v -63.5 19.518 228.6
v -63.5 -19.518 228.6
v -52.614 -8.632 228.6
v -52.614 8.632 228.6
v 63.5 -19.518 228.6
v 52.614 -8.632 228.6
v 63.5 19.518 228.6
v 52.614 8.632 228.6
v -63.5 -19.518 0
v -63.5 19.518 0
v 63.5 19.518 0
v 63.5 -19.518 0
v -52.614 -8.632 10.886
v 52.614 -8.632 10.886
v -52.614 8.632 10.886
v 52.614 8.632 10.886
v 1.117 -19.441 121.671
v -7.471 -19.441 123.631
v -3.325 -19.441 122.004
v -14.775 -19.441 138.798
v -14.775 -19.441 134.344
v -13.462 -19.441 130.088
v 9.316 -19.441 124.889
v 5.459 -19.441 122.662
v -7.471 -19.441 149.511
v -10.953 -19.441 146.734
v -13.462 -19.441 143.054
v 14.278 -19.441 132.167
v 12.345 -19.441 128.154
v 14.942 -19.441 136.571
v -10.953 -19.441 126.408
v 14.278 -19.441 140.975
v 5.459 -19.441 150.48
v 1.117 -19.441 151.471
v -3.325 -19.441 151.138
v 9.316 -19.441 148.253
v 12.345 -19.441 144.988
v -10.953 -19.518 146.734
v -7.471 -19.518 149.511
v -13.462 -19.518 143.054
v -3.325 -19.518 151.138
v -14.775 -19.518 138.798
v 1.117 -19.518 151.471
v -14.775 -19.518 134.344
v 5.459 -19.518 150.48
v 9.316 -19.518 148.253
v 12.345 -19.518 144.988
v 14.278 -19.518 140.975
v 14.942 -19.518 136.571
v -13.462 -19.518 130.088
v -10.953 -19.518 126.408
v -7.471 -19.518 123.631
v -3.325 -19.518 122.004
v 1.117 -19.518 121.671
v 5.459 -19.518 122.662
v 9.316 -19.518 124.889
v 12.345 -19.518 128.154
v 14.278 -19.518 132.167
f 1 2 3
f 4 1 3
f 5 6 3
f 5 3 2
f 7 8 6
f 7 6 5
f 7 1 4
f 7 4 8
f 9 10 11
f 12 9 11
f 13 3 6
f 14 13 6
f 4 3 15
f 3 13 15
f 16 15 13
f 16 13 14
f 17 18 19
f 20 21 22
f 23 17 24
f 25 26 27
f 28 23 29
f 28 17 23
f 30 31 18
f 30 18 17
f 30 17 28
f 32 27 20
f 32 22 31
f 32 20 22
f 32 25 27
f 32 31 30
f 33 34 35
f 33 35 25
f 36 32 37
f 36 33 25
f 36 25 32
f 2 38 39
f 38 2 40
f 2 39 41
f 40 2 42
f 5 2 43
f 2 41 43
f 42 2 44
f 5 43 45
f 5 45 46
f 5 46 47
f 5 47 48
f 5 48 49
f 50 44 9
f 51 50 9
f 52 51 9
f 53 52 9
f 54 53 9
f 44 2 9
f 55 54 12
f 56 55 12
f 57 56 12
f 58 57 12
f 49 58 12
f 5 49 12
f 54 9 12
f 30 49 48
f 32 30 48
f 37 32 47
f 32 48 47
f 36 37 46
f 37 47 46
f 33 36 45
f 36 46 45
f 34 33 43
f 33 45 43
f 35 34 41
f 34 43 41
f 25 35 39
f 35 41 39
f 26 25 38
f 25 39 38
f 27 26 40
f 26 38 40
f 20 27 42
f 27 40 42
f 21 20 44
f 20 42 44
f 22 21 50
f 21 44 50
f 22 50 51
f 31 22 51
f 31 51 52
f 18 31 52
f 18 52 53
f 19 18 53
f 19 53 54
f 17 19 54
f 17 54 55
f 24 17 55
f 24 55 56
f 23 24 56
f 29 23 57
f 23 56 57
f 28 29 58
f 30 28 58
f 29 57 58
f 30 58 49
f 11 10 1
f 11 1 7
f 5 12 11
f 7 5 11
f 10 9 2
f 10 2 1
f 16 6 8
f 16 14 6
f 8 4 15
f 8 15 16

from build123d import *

# Parameters (mm, degrees)
F0_W     = 127
F0_H     = 39.0351824462
F1_DEPTH = 228.6
F2_T     = -10.8857142857
F3_R     = 14.9416499322
F4_DEPTH = 0.0762


# Not quite as in the source:
# - a length typed as a fraction of an inch, garbled in the dataset ("3 / 203.2 mm" for 3/8 in), is restored


with BuildPart() as f1:
    # F0 (on Top) → F1 (new body)
    with BuildSketch(Plane.XY):
        Rectangle(F0_W, F0_H)
    extrude(amount=F1_DEPTH)

    # F2
    f2_openings = [f1.faces().sort_by_distance(p)[0] for p in [
        (0, 0, 228.6),
    ]]
    offset(amount=F2_T, openings=f2_openings)

    # F3 (on face) → F4 (cut)
    with BuildSketch(Plane.XZ.offset(19.5175912231)):
        with Locations((0, 136.5711838007)):
            Circle(F3_R)
    extrude(amount=-F4_DEPTH, mode=Mode.SUBTRACT)


solid = f1.part
